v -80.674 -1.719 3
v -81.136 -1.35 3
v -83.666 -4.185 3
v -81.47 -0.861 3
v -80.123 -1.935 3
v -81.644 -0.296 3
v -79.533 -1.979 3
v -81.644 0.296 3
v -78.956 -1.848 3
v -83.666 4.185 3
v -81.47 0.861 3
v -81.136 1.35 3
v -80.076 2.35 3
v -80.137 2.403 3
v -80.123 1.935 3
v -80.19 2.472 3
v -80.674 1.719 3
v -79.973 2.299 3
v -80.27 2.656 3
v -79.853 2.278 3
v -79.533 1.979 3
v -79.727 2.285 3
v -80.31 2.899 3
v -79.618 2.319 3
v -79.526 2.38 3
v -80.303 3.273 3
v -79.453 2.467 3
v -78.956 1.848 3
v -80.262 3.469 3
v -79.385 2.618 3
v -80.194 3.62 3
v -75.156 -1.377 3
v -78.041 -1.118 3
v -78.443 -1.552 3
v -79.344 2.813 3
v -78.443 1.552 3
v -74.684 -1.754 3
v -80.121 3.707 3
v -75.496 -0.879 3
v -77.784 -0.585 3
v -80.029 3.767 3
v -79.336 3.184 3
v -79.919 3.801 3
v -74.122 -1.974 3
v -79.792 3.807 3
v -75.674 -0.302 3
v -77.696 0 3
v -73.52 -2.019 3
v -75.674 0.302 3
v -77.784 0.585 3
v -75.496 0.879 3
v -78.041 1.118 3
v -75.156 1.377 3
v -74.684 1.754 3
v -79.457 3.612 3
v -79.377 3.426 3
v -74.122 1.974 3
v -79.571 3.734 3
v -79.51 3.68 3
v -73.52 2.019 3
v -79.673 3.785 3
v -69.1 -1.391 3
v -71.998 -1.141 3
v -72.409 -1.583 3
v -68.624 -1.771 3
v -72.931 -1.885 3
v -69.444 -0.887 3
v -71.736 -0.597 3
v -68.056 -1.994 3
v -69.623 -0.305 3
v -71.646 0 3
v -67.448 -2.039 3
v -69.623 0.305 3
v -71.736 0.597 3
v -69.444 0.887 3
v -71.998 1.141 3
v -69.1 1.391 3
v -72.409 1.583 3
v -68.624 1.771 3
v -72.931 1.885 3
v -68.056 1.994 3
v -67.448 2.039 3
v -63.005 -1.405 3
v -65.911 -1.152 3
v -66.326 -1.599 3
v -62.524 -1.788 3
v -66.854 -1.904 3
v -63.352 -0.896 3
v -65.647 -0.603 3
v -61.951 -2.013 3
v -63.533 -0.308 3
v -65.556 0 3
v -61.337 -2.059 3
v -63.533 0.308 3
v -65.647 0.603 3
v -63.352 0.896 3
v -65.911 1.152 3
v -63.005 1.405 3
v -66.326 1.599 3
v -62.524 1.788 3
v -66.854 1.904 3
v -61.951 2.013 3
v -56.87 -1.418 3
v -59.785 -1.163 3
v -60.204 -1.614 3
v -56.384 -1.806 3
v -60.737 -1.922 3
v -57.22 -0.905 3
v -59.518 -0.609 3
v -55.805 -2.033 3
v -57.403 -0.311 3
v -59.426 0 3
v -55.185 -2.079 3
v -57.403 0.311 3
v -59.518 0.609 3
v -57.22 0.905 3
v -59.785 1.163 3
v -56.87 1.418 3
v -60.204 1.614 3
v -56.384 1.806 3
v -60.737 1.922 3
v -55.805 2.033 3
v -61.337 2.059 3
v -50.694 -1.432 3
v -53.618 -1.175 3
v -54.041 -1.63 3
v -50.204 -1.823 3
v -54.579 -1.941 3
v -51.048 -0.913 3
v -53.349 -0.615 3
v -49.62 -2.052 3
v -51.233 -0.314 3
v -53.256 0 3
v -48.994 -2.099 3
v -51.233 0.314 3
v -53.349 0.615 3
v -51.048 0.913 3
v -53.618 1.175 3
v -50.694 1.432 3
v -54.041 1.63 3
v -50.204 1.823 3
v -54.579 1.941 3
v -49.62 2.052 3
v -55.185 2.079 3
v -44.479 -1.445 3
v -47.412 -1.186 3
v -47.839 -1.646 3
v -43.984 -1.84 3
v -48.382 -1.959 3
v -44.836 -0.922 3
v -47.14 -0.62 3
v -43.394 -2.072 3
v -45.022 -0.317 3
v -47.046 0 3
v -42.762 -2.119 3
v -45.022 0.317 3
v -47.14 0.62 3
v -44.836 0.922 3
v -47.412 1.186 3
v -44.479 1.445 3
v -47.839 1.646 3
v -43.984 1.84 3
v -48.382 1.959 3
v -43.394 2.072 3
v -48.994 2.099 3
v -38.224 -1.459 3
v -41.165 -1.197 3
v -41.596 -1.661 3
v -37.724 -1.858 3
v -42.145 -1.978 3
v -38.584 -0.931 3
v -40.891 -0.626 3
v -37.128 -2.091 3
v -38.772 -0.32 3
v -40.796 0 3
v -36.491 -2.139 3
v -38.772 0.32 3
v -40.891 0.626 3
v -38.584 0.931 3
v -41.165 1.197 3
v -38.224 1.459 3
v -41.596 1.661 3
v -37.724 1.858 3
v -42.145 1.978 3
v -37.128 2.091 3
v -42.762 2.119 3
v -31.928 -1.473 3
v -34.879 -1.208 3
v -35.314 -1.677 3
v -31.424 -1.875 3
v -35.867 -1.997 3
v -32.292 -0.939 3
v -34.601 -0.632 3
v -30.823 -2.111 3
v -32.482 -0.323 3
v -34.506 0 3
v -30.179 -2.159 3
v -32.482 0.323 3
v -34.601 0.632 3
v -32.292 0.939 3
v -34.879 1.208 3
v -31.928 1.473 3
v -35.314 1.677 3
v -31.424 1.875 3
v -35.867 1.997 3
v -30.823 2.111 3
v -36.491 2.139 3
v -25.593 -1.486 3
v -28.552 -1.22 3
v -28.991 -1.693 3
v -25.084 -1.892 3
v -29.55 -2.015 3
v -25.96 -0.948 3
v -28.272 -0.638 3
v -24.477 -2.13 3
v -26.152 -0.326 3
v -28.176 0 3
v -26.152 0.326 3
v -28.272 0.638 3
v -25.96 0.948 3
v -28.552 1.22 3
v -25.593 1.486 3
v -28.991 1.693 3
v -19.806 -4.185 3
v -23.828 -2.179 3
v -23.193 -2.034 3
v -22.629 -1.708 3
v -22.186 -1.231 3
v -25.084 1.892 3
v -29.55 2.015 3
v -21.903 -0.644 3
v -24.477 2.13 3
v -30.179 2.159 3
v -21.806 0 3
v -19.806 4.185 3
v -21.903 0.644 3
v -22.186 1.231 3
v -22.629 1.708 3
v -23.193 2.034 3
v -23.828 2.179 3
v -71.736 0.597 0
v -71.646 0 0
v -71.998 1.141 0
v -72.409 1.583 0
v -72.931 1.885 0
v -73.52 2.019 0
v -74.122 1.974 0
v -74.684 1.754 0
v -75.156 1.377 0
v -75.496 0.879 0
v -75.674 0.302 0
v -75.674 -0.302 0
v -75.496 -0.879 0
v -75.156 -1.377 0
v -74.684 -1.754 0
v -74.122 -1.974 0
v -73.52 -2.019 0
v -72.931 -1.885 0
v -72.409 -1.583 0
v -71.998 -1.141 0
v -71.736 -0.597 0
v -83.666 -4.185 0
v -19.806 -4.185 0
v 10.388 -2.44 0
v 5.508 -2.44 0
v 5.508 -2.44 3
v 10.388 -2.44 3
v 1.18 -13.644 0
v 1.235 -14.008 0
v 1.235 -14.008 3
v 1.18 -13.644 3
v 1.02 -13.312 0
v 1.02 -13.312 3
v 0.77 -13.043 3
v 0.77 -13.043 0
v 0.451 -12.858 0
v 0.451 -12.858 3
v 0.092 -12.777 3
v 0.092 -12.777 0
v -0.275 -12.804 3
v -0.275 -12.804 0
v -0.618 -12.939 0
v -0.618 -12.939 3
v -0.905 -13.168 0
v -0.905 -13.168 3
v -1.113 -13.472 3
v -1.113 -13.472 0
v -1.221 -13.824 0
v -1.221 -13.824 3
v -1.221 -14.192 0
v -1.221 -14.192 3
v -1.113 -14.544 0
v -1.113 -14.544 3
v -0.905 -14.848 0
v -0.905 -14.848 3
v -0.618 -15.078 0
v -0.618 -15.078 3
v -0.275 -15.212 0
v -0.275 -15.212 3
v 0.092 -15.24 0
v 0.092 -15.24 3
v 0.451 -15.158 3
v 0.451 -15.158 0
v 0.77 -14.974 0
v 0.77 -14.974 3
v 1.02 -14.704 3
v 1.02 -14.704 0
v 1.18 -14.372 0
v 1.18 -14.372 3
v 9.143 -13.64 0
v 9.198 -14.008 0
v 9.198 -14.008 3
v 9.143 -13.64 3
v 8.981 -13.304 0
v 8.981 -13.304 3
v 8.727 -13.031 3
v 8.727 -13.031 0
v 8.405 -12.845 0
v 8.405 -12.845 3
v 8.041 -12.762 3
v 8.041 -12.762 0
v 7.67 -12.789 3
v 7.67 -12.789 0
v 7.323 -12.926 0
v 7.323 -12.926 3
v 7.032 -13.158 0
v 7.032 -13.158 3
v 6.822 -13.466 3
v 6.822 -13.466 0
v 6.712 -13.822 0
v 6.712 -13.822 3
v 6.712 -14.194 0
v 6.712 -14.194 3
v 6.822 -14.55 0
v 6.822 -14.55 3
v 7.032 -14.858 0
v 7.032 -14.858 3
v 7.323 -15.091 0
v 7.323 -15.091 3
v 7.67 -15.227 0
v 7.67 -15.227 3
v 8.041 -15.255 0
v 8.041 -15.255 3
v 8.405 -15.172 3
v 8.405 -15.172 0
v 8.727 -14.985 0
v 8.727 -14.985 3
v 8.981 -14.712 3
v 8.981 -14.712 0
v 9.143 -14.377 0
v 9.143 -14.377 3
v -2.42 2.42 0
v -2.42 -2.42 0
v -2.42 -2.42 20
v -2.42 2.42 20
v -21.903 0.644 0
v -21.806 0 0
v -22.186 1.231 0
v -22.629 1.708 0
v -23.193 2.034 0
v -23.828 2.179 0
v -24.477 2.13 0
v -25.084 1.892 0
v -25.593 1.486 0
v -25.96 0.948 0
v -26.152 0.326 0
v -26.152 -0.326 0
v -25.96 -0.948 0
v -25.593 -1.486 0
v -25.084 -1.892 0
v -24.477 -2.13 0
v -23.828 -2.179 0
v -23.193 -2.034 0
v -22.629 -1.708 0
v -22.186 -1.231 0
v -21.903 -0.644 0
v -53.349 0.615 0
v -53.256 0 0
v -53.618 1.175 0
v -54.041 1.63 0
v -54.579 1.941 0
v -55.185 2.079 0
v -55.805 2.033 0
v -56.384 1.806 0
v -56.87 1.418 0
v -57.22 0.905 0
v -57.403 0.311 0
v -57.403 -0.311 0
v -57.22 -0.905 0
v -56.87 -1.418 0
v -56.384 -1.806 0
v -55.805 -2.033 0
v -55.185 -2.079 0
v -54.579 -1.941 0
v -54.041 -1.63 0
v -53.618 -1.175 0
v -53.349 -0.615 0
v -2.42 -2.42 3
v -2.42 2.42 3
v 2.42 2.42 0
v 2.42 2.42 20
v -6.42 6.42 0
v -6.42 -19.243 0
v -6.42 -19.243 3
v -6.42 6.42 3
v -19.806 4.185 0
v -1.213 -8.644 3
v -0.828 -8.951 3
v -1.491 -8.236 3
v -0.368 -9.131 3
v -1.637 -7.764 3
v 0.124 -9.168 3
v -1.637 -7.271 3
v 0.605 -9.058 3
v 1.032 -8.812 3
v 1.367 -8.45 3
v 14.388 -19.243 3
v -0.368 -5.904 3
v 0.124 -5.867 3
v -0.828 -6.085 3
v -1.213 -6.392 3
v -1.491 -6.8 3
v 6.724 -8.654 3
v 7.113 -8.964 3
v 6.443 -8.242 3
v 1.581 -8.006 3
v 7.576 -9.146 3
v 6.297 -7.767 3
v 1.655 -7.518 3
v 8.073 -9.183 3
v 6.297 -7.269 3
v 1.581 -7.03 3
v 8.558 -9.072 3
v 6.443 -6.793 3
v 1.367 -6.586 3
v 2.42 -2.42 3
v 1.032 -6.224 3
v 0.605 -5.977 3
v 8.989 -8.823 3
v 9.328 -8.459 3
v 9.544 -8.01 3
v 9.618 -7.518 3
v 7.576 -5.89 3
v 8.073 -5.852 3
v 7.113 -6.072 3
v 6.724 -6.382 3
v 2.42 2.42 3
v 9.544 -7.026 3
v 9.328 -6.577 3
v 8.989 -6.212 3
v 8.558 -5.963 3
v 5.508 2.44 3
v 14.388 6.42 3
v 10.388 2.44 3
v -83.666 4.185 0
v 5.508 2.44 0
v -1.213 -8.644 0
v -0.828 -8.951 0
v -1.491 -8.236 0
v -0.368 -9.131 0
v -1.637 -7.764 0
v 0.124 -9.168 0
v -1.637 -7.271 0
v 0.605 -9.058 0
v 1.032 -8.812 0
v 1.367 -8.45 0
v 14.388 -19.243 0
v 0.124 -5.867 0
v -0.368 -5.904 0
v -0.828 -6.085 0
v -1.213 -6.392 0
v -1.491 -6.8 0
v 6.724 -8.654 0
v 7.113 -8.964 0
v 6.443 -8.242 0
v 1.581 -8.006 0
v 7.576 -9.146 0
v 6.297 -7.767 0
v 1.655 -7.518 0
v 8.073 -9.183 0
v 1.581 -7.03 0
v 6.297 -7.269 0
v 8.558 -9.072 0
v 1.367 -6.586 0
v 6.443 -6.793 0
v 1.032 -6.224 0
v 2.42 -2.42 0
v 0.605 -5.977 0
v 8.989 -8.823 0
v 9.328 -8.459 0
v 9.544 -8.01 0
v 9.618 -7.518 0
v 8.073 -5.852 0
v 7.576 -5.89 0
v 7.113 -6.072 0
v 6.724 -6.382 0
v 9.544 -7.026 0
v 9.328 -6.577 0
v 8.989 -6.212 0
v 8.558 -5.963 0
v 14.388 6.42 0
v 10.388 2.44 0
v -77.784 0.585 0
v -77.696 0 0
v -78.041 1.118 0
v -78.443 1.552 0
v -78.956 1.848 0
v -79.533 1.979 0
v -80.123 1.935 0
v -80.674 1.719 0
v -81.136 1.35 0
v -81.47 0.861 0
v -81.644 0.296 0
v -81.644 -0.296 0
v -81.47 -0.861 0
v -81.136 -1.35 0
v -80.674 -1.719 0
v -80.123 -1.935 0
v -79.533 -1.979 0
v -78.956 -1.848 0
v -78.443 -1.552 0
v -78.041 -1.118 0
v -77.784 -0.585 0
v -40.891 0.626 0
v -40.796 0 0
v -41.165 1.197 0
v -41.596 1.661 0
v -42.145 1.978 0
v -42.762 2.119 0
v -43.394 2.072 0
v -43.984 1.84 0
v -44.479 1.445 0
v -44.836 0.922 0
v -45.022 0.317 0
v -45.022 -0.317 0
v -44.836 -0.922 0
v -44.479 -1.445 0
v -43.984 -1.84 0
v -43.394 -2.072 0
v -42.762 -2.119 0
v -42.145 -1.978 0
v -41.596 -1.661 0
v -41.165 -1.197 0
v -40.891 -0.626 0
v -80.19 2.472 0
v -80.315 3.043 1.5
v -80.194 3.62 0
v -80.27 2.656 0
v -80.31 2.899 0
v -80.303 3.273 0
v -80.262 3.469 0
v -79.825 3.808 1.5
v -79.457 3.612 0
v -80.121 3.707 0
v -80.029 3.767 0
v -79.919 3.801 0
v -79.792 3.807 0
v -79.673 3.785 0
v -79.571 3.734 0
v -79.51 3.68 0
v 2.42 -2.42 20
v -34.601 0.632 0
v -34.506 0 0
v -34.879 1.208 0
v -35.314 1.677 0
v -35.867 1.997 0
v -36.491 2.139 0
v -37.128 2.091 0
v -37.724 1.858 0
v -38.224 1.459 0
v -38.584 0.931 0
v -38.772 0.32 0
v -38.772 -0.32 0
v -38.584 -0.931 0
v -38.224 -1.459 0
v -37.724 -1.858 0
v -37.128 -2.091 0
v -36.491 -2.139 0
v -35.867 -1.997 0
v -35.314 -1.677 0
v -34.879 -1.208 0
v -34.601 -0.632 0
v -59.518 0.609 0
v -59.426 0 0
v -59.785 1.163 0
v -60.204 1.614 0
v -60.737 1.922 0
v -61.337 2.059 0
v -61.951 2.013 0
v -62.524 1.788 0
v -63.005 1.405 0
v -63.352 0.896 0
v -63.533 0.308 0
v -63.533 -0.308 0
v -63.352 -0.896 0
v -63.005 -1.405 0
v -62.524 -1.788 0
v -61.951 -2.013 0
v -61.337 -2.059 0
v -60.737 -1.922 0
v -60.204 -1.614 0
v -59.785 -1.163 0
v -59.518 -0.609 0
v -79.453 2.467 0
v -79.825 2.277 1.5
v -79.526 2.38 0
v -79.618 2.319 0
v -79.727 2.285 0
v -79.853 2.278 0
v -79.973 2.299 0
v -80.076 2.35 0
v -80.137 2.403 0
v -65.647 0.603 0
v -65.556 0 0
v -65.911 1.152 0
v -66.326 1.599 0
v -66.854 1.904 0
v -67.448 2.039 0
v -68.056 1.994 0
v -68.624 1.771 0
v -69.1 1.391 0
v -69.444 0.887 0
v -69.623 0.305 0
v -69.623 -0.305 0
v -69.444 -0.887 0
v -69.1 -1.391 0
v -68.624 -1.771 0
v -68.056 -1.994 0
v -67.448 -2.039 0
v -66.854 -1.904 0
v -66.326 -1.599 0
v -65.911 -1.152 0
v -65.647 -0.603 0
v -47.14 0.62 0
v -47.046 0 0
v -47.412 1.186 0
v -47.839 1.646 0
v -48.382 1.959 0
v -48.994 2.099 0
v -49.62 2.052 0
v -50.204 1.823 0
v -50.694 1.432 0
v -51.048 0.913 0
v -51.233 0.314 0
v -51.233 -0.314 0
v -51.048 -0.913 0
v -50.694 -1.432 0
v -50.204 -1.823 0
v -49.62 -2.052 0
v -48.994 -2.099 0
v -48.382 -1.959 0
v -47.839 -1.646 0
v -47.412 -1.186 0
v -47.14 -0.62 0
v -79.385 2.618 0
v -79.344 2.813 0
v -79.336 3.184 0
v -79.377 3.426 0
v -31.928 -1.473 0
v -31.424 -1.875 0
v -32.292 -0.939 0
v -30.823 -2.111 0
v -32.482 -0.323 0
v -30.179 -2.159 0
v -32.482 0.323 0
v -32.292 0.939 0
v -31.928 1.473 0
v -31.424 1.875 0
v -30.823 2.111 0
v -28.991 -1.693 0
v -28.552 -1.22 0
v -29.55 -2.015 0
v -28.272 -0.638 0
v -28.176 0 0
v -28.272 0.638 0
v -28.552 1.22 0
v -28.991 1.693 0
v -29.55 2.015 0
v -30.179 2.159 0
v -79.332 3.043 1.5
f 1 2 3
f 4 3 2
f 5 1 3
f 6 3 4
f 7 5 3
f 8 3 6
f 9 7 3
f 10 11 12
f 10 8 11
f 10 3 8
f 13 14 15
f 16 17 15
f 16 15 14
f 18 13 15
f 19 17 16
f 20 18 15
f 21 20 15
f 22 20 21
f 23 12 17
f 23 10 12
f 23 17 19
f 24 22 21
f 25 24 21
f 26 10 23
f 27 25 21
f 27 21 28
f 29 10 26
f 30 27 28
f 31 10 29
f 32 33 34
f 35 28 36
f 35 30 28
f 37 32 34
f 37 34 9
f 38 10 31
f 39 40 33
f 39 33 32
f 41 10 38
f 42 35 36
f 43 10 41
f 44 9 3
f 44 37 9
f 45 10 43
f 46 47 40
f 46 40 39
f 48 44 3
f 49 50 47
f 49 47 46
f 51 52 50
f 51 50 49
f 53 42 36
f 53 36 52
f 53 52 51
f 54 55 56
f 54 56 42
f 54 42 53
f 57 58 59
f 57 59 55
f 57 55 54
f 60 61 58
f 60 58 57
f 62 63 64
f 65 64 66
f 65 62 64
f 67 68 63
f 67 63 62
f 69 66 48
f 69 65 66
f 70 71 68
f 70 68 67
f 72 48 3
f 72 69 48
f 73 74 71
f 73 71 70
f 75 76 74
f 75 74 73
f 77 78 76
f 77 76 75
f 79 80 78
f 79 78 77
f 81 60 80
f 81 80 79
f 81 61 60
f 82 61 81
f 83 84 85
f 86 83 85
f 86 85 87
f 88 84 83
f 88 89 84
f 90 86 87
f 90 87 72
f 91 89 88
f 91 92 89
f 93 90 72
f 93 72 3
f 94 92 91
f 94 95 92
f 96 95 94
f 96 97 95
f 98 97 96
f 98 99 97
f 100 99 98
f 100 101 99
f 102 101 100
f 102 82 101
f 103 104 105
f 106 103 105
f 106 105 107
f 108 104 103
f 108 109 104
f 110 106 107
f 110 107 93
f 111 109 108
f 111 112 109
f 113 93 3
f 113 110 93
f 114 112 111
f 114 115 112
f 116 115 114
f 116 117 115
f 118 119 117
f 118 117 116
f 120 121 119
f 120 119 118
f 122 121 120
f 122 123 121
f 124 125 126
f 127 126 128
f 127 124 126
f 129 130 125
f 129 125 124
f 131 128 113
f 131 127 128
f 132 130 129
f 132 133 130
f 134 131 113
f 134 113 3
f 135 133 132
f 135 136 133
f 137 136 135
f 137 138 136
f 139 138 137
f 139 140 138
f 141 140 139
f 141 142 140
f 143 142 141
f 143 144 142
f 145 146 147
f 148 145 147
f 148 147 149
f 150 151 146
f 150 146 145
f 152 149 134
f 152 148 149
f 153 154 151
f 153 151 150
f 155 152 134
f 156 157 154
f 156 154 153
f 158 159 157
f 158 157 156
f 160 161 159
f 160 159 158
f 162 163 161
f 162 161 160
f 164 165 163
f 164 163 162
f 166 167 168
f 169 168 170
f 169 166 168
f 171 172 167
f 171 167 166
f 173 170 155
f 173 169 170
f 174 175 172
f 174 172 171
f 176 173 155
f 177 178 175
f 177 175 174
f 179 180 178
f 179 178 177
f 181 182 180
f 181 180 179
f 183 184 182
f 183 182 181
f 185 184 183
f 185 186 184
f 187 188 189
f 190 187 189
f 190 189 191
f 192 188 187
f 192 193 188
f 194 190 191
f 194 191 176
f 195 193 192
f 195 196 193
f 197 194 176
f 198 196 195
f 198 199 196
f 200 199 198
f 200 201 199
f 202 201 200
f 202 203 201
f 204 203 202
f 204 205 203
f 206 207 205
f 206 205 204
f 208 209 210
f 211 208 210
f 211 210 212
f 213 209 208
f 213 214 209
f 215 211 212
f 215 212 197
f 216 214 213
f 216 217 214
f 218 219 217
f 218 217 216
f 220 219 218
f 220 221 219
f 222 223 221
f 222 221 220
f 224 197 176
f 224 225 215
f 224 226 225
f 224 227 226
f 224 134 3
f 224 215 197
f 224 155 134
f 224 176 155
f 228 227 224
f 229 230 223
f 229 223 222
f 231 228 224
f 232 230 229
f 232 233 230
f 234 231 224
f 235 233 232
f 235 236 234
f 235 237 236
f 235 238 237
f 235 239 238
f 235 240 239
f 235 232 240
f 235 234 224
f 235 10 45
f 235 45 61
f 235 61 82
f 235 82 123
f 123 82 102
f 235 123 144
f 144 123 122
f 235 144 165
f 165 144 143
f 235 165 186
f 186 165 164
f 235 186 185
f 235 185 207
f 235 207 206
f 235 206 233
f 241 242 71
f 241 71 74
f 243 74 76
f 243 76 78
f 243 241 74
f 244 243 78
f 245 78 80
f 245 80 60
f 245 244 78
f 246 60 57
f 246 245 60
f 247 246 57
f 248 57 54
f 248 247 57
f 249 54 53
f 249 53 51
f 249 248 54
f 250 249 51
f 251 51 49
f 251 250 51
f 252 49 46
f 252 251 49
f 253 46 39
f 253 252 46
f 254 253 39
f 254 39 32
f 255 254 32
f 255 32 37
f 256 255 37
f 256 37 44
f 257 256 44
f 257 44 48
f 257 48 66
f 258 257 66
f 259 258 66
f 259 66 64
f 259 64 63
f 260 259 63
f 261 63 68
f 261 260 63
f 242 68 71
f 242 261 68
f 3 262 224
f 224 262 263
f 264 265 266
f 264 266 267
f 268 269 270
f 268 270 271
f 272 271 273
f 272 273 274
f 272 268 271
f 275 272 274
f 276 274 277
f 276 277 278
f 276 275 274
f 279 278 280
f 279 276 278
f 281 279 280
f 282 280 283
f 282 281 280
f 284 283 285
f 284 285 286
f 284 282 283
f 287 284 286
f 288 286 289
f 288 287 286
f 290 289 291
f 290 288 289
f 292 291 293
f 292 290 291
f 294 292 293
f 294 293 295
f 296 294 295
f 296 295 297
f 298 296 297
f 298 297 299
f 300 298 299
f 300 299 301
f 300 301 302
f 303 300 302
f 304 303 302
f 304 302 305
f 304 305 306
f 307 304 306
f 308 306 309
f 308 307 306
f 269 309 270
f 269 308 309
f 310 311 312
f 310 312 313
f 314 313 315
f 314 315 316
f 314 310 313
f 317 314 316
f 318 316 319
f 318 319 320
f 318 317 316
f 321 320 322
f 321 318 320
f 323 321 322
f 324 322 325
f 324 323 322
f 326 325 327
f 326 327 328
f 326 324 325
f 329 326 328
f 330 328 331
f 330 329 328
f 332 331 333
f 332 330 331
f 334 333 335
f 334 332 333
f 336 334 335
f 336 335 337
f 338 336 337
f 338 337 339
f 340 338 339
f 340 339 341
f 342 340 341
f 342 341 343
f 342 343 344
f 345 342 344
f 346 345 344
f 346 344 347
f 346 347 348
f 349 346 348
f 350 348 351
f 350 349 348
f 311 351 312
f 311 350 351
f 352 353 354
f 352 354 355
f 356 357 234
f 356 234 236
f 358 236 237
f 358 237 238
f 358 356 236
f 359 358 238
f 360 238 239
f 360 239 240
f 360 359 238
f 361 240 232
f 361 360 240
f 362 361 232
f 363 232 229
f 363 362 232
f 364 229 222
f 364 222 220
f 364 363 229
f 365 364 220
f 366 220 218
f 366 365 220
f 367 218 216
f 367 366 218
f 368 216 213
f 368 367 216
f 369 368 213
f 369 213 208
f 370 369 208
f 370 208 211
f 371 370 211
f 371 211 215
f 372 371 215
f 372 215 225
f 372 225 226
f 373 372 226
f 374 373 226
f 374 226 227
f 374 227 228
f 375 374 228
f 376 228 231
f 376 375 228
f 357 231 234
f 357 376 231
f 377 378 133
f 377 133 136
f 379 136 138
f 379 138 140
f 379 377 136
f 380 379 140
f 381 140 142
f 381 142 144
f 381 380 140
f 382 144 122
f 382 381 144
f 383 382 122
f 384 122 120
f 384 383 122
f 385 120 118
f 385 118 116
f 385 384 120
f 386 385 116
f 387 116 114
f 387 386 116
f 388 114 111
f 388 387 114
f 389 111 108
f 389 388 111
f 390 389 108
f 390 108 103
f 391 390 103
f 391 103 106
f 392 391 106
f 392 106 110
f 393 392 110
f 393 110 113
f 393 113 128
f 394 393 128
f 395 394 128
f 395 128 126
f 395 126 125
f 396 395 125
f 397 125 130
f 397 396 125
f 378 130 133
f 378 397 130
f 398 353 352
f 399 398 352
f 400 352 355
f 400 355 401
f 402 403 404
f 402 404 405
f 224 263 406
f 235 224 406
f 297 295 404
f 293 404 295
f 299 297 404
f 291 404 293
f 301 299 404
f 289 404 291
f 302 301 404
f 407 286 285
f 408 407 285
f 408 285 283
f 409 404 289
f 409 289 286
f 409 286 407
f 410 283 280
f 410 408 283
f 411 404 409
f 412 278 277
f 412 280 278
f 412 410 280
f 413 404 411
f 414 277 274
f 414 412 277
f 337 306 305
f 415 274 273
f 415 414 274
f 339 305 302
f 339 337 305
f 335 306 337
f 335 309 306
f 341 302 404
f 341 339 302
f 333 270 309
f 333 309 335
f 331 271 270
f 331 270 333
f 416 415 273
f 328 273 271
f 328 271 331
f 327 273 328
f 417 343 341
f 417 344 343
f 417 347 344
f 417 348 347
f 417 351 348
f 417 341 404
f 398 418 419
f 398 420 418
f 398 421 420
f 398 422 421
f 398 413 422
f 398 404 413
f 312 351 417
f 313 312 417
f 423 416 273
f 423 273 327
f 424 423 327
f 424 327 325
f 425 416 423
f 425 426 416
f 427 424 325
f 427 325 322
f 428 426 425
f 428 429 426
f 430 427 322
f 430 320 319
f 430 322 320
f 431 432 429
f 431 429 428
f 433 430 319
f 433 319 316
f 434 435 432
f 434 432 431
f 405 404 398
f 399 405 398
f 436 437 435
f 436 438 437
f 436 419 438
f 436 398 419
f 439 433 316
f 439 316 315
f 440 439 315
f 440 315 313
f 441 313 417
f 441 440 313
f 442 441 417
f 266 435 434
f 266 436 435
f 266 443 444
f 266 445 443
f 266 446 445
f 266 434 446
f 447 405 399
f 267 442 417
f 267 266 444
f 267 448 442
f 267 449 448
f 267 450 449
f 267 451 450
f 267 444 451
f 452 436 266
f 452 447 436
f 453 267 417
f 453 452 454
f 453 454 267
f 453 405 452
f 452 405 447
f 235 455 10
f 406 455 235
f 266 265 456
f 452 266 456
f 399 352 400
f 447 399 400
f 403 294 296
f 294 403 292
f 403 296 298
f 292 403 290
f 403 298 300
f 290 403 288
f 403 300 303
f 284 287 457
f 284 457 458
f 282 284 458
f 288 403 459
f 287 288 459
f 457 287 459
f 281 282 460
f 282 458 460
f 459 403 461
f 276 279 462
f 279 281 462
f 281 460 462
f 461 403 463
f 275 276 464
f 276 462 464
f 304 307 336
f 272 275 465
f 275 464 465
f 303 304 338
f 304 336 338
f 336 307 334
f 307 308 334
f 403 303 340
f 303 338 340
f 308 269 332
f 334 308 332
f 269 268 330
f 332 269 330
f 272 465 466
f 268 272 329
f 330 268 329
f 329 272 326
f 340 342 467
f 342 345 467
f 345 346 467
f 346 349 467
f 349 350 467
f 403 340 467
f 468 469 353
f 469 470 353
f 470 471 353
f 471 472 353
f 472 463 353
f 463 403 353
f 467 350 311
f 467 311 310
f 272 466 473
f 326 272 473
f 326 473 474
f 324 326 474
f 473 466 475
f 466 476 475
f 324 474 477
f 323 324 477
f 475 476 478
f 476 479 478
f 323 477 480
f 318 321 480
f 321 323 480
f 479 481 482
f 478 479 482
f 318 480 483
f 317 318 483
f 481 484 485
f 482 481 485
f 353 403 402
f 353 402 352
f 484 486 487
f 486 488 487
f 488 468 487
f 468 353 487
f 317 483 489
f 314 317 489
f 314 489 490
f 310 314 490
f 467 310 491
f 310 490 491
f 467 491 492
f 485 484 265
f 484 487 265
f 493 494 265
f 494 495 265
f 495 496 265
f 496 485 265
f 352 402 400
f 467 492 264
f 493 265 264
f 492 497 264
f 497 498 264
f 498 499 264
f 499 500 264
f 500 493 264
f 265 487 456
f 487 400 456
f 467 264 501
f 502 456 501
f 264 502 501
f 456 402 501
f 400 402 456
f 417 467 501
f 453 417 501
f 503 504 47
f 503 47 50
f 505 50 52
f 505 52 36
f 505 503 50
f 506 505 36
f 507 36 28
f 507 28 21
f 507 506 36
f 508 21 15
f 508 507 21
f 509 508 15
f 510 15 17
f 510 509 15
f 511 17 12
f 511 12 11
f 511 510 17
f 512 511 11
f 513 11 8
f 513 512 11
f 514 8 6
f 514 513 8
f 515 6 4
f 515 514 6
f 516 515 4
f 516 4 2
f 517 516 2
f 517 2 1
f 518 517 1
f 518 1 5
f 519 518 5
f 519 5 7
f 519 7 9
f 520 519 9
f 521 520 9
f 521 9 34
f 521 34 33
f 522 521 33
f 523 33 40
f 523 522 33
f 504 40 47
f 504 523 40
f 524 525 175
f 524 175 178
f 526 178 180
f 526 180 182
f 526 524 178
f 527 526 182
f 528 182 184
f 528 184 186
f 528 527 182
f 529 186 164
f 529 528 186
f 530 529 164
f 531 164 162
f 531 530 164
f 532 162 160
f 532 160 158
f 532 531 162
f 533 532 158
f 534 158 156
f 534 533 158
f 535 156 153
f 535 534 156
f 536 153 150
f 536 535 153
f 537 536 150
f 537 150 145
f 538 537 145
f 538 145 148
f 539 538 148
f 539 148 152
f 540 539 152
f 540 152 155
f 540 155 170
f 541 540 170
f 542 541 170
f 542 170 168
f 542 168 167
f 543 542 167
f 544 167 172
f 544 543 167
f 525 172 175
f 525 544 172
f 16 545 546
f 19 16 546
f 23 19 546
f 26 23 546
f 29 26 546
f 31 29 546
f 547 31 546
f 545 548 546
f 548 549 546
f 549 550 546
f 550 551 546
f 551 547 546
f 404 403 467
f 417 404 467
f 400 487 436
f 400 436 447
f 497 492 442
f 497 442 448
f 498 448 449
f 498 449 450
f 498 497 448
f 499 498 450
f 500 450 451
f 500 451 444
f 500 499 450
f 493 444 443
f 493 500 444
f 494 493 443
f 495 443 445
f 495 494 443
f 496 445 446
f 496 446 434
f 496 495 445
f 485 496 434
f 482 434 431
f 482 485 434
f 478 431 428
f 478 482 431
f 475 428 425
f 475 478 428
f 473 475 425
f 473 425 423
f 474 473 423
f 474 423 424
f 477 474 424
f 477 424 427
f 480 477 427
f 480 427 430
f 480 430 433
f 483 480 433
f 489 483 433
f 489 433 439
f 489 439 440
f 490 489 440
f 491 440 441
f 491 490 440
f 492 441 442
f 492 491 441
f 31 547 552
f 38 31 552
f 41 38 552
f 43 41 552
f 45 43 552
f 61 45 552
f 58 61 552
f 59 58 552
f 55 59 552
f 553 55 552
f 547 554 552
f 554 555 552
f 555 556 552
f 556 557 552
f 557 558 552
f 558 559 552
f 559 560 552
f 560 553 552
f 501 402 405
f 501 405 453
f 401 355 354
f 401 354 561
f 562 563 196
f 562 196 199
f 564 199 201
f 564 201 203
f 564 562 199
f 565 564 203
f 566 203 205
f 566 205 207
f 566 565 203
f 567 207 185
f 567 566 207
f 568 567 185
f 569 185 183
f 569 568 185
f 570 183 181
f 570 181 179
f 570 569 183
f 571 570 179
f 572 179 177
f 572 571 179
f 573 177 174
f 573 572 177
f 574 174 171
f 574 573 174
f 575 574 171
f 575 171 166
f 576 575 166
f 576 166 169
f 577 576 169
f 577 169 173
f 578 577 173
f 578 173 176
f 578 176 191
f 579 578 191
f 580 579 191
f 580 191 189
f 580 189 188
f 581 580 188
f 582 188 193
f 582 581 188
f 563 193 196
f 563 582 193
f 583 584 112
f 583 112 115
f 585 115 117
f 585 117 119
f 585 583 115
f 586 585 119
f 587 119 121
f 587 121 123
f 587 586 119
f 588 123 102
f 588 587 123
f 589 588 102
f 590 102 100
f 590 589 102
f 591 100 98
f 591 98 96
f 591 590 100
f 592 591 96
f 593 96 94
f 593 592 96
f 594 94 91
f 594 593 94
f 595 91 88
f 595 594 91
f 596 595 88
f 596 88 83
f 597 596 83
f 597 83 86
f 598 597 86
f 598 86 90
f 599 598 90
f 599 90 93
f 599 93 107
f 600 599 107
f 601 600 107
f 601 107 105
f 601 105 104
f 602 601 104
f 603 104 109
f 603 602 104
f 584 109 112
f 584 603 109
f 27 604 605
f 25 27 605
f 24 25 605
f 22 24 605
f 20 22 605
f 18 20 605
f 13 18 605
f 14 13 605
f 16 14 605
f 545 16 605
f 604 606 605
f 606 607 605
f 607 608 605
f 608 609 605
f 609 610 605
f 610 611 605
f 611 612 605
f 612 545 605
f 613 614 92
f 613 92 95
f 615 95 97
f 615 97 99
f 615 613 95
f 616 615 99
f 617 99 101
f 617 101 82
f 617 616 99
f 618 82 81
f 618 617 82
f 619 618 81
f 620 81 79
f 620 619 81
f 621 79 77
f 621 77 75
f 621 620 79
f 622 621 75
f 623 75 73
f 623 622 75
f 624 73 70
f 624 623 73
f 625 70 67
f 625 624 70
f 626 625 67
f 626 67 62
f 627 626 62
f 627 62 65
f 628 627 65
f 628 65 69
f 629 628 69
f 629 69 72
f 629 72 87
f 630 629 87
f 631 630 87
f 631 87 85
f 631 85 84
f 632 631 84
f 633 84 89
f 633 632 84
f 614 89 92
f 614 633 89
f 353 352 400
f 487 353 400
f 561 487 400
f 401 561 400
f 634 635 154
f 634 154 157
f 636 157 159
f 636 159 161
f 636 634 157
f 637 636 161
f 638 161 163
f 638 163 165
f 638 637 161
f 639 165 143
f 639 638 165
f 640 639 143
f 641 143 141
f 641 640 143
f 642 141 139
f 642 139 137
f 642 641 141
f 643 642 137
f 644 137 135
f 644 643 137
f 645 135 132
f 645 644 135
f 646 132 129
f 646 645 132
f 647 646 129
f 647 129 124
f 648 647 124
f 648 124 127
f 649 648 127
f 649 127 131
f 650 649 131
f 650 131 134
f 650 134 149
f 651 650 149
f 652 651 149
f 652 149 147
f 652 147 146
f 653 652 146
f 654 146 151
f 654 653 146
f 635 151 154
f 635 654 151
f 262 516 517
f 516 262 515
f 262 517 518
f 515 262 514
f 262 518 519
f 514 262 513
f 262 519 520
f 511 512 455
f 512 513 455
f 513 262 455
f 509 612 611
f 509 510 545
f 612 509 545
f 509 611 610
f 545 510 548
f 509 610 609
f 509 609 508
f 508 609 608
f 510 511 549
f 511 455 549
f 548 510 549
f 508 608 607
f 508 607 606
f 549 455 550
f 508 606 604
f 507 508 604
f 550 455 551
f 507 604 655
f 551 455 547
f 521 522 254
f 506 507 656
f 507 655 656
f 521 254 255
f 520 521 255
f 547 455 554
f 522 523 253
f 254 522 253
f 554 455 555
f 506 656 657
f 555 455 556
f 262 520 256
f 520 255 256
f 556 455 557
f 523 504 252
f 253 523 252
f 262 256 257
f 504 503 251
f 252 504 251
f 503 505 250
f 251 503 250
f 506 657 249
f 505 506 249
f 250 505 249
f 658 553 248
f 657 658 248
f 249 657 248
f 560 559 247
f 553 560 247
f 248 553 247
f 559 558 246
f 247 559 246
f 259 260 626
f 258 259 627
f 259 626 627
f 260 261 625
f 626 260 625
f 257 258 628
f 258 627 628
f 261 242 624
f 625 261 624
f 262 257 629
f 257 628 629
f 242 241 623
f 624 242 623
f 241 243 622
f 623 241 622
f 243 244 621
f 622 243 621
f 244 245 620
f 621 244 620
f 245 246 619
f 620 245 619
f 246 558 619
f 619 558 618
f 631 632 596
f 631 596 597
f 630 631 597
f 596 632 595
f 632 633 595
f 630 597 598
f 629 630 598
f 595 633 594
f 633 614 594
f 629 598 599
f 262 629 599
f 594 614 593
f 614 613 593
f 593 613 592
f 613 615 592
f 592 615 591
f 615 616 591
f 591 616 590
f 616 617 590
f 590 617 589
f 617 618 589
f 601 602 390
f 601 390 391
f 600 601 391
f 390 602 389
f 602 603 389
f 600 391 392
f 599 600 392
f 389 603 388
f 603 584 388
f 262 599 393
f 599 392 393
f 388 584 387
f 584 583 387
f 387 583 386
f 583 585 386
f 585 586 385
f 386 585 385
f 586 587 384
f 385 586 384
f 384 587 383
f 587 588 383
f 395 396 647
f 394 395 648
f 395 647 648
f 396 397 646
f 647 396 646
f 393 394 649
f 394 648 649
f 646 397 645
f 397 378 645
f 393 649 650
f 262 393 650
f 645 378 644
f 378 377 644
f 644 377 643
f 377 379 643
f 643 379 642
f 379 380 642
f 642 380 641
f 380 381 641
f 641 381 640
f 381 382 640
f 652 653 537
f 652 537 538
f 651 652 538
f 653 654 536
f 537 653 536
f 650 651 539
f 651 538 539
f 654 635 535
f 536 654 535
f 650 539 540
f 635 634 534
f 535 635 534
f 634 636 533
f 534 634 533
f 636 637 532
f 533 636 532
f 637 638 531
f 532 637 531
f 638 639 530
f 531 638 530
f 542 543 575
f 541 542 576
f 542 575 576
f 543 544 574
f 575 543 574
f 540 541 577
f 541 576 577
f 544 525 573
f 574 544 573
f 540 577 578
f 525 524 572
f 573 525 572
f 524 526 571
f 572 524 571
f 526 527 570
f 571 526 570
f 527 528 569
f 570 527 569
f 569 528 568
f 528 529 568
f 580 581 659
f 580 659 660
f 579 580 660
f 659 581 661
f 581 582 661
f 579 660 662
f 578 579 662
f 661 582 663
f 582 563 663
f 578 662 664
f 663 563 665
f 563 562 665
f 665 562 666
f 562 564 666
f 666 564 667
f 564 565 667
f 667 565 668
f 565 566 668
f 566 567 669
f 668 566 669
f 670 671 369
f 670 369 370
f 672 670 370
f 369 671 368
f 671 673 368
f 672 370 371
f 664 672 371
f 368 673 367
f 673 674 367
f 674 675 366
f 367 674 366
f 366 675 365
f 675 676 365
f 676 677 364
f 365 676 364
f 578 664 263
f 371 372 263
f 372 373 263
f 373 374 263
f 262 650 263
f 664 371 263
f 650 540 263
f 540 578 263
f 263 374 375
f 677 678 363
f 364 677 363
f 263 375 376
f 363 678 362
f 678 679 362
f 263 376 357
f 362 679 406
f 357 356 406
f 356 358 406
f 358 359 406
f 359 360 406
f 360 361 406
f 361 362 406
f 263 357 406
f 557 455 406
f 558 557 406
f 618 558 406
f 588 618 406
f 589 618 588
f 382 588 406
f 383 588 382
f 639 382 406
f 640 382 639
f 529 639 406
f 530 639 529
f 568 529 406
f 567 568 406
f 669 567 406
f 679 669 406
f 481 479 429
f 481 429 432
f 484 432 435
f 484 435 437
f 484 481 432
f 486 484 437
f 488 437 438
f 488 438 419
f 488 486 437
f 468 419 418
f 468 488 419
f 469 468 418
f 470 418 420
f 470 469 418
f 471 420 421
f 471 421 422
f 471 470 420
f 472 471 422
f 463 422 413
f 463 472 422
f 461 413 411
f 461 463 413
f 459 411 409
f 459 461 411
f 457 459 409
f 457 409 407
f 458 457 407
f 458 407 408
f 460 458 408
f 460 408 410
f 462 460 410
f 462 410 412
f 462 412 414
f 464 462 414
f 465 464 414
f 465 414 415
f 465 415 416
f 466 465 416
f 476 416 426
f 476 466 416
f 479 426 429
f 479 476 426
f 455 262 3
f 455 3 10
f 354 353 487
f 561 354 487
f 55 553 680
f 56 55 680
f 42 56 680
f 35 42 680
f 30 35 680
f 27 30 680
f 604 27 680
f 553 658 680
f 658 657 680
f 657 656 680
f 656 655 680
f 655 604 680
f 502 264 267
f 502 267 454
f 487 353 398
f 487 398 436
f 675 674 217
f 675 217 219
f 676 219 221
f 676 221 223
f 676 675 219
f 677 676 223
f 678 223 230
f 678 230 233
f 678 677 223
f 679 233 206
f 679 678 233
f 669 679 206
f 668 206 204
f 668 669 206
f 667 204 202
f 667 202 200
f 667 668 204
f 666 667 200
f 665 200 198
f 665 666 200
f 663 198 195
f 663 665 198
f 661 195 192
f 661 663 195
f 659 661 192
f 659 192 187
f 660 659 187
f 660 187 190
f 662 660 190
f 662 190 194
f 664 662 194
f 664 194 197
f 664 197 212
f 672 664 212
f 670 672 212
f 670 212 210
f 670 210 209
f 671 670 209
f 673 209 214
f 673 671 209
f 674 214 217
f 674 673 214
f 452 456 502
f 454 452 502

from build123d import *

# Parameters (mm, degrees)
F0_W     = 63.86
F0_H     = 8.37
F0_R     = 1.985
F0_R_2   = 2.025
F0_R_3   = 2.045
F0_R_4   = 2.065
F0_R_5   = 2.085
F0_R_6   = 2.105
F0_R_7   = 2.125
F0_R_8   = 2.145
F0_R_9   = 2.165
F0_R_10  = 2.185
F1_DEPTH = 3
F2_W     = 20.8080409622
F2_H     = 25.6631081086
F2_R     = 1.235
F2_R_2   = 1.655
F2_R_3   = 1.25
F2_R_4   = 1.67
F2_W_2   = 4.84
F2_H_2   = 4.84
F2_W_3   = 4.88
F2_H_3   = 4.88
F3_DEPTH = 3
F4_DEPTH = 20


with BuildPart() as f1:
    # F0 (on Top) → F1 (new body)
    with BuildSketch(Plane.XY):
        with Locations((-51.7361271751, 0)):
            Rectangle(F0_W, F0_H)
        with Locations((-79.6811271751, 0)):
            Circle(F0_R, mode=Mode.SUBTRACT)
        with Locations((-73.6711271751, 0)):
            Circle(F0_R_2, mode=Mode.SUBTRACT)
        with Locations((-67.6011271751, 0)):
            Circle(F0_R_3, mode=Mode.SUBTRACT)
        with Locations((-61.4911271751, 0)):
            Circle(F0_R_4, mode=Mode.SUBTRACT)
        with Locations((-55.3411271751, 0)):
            Circle(F0_R_5, mode=Mode.SUBTRACT)
        with BuildLine():
            add(Edge.make_bspline(
                [(-79.4572016597, 3.6116019332), (-79.331550618, 3.4151501103), (-79.331550618, 3.0430797978)],
                knots=[0, 0, 0, 1, 1, 1], degree=2))
            add(Edge.make_bspline(
                [(-79.331550618, 3.0430797978), (-79.331550618, 2.6573376103), (-79.4531326493, 2.4670706832)],
                knots=[0, 0, 0, 1, 1, 1], degree=2))
            add(Edge.make_bspline(
                [(-79.4531326493, 2.4670706832), (-79.5747146805, 2.2768037561), (-79.8250402013, 2.2768037561)],
                knots=[0, 0, 0, 1, 1, 1], degree=2))
            add(Edge.make_bspline(
                [(-79.8250402013, 2.2768037561), (-80.0649490555, 2.2768037561), (-80.1901118159, 2.4716279749)],
                knots=[0, 0, 0, 1, 1, 1], degree=2))
            add(Edge.make_bspline(
                [(-80.1901118159, 2.4716279749), (-80.3152745763, 2.6664521936), (-80.3152745763, 3.0430797978)],
                knots=[0, 0, 0, 1, 1, 1], degree=2))
            add(Edge.make_bspline(
                [(-80.3152745763, 3.0430797978), (-80.3152745763, 3.431426152), (-80.1941808263, 3.619739954)],
                knots=[0, 0, 0, 1, 1, 1], degree=2))
            add(Edge.make_bspline(
                [(-80.1941808263, 3.619739954), (-80.0730870763, 3.8080537561), (-79.8250402013, 3.8080537561)],
                knots=[0, 0, 0, 1, 1, 1], degree=2))
            add(Edge.make_bspline(
                [(-79.8250402013, 3.8080537561), (-79.5828527013, 3.8080537561), (-79.4572016597, 3.6116019332)],
                knots=[0, 0, 0, 1, 1, 1], degree=2))
        make_face(mode=Mode.SUBTRACT)
        with Locations((-49.1511271751, 0)):
            Circle(F0_R_6, mode=Mode.SUBTRACT)
        with Locations((-42.9211271751, 0)):
            Circle(F0_R_7, mode=Mode.SUBTRACT)
        with Locations((-36.6511271751, 0)):
            Circle(F0_R_8, mode=Mode.SUBTRACT)
        with Locations((-30.3411271751, 0)):
            Circle(F0_R_9, mode=Mode.SUBTRACT)
        with Locations((-23.9911271751, 0)):
            Circle(F0_R_10, mode=Mode.SUBTRACT)
    extrude(amount=F1_DEPTH)


with BuildPart() as f3:
    # F2 (on Top) → F3 (new body)
    with BuildSketch(Plane.XY):
        with Locations((3.9840204811, -6.4115540543)):
            Rectangle(F2_W, F2_H)
        with Locations((0, -14.0081081086)):
            Circle(F2_R, mode=Mode.SUBTRACT)
        with Locations((0, -7.5178151019)):
            Circle(F2_R_2, mode=Mode.SUBTRACT)
        with Locations((7.9480409622, -14.0081081086)):
            Circle(F2_R_3, mode=Mode.SUBTRACT)
        with Locations((7.9480409622, -7.5178151019)):
            Circle(F2_R_4, mode=Mode.SUBTRACT)
        Rectangle(F2_W_2, F2_H_2, mode=Mode.SUBTRACT)
        with Locations((7.9480409622, 0)):
            Rectangle(F2_W_3, F2_H_3, mode=Mode.SUBTRACT)
    extrude(amount=F3_DEPTH)


with BuildPart() as f4:
    # F2 (on Top) → F4 (new body)
    with BuildSketch(Plane.XY):
        Rectangle(F2_W_2, F2_H_2)
    extrude(amount=F4_DEPTH)


solid = Compound([f1.part, f3.part, f4.part])
